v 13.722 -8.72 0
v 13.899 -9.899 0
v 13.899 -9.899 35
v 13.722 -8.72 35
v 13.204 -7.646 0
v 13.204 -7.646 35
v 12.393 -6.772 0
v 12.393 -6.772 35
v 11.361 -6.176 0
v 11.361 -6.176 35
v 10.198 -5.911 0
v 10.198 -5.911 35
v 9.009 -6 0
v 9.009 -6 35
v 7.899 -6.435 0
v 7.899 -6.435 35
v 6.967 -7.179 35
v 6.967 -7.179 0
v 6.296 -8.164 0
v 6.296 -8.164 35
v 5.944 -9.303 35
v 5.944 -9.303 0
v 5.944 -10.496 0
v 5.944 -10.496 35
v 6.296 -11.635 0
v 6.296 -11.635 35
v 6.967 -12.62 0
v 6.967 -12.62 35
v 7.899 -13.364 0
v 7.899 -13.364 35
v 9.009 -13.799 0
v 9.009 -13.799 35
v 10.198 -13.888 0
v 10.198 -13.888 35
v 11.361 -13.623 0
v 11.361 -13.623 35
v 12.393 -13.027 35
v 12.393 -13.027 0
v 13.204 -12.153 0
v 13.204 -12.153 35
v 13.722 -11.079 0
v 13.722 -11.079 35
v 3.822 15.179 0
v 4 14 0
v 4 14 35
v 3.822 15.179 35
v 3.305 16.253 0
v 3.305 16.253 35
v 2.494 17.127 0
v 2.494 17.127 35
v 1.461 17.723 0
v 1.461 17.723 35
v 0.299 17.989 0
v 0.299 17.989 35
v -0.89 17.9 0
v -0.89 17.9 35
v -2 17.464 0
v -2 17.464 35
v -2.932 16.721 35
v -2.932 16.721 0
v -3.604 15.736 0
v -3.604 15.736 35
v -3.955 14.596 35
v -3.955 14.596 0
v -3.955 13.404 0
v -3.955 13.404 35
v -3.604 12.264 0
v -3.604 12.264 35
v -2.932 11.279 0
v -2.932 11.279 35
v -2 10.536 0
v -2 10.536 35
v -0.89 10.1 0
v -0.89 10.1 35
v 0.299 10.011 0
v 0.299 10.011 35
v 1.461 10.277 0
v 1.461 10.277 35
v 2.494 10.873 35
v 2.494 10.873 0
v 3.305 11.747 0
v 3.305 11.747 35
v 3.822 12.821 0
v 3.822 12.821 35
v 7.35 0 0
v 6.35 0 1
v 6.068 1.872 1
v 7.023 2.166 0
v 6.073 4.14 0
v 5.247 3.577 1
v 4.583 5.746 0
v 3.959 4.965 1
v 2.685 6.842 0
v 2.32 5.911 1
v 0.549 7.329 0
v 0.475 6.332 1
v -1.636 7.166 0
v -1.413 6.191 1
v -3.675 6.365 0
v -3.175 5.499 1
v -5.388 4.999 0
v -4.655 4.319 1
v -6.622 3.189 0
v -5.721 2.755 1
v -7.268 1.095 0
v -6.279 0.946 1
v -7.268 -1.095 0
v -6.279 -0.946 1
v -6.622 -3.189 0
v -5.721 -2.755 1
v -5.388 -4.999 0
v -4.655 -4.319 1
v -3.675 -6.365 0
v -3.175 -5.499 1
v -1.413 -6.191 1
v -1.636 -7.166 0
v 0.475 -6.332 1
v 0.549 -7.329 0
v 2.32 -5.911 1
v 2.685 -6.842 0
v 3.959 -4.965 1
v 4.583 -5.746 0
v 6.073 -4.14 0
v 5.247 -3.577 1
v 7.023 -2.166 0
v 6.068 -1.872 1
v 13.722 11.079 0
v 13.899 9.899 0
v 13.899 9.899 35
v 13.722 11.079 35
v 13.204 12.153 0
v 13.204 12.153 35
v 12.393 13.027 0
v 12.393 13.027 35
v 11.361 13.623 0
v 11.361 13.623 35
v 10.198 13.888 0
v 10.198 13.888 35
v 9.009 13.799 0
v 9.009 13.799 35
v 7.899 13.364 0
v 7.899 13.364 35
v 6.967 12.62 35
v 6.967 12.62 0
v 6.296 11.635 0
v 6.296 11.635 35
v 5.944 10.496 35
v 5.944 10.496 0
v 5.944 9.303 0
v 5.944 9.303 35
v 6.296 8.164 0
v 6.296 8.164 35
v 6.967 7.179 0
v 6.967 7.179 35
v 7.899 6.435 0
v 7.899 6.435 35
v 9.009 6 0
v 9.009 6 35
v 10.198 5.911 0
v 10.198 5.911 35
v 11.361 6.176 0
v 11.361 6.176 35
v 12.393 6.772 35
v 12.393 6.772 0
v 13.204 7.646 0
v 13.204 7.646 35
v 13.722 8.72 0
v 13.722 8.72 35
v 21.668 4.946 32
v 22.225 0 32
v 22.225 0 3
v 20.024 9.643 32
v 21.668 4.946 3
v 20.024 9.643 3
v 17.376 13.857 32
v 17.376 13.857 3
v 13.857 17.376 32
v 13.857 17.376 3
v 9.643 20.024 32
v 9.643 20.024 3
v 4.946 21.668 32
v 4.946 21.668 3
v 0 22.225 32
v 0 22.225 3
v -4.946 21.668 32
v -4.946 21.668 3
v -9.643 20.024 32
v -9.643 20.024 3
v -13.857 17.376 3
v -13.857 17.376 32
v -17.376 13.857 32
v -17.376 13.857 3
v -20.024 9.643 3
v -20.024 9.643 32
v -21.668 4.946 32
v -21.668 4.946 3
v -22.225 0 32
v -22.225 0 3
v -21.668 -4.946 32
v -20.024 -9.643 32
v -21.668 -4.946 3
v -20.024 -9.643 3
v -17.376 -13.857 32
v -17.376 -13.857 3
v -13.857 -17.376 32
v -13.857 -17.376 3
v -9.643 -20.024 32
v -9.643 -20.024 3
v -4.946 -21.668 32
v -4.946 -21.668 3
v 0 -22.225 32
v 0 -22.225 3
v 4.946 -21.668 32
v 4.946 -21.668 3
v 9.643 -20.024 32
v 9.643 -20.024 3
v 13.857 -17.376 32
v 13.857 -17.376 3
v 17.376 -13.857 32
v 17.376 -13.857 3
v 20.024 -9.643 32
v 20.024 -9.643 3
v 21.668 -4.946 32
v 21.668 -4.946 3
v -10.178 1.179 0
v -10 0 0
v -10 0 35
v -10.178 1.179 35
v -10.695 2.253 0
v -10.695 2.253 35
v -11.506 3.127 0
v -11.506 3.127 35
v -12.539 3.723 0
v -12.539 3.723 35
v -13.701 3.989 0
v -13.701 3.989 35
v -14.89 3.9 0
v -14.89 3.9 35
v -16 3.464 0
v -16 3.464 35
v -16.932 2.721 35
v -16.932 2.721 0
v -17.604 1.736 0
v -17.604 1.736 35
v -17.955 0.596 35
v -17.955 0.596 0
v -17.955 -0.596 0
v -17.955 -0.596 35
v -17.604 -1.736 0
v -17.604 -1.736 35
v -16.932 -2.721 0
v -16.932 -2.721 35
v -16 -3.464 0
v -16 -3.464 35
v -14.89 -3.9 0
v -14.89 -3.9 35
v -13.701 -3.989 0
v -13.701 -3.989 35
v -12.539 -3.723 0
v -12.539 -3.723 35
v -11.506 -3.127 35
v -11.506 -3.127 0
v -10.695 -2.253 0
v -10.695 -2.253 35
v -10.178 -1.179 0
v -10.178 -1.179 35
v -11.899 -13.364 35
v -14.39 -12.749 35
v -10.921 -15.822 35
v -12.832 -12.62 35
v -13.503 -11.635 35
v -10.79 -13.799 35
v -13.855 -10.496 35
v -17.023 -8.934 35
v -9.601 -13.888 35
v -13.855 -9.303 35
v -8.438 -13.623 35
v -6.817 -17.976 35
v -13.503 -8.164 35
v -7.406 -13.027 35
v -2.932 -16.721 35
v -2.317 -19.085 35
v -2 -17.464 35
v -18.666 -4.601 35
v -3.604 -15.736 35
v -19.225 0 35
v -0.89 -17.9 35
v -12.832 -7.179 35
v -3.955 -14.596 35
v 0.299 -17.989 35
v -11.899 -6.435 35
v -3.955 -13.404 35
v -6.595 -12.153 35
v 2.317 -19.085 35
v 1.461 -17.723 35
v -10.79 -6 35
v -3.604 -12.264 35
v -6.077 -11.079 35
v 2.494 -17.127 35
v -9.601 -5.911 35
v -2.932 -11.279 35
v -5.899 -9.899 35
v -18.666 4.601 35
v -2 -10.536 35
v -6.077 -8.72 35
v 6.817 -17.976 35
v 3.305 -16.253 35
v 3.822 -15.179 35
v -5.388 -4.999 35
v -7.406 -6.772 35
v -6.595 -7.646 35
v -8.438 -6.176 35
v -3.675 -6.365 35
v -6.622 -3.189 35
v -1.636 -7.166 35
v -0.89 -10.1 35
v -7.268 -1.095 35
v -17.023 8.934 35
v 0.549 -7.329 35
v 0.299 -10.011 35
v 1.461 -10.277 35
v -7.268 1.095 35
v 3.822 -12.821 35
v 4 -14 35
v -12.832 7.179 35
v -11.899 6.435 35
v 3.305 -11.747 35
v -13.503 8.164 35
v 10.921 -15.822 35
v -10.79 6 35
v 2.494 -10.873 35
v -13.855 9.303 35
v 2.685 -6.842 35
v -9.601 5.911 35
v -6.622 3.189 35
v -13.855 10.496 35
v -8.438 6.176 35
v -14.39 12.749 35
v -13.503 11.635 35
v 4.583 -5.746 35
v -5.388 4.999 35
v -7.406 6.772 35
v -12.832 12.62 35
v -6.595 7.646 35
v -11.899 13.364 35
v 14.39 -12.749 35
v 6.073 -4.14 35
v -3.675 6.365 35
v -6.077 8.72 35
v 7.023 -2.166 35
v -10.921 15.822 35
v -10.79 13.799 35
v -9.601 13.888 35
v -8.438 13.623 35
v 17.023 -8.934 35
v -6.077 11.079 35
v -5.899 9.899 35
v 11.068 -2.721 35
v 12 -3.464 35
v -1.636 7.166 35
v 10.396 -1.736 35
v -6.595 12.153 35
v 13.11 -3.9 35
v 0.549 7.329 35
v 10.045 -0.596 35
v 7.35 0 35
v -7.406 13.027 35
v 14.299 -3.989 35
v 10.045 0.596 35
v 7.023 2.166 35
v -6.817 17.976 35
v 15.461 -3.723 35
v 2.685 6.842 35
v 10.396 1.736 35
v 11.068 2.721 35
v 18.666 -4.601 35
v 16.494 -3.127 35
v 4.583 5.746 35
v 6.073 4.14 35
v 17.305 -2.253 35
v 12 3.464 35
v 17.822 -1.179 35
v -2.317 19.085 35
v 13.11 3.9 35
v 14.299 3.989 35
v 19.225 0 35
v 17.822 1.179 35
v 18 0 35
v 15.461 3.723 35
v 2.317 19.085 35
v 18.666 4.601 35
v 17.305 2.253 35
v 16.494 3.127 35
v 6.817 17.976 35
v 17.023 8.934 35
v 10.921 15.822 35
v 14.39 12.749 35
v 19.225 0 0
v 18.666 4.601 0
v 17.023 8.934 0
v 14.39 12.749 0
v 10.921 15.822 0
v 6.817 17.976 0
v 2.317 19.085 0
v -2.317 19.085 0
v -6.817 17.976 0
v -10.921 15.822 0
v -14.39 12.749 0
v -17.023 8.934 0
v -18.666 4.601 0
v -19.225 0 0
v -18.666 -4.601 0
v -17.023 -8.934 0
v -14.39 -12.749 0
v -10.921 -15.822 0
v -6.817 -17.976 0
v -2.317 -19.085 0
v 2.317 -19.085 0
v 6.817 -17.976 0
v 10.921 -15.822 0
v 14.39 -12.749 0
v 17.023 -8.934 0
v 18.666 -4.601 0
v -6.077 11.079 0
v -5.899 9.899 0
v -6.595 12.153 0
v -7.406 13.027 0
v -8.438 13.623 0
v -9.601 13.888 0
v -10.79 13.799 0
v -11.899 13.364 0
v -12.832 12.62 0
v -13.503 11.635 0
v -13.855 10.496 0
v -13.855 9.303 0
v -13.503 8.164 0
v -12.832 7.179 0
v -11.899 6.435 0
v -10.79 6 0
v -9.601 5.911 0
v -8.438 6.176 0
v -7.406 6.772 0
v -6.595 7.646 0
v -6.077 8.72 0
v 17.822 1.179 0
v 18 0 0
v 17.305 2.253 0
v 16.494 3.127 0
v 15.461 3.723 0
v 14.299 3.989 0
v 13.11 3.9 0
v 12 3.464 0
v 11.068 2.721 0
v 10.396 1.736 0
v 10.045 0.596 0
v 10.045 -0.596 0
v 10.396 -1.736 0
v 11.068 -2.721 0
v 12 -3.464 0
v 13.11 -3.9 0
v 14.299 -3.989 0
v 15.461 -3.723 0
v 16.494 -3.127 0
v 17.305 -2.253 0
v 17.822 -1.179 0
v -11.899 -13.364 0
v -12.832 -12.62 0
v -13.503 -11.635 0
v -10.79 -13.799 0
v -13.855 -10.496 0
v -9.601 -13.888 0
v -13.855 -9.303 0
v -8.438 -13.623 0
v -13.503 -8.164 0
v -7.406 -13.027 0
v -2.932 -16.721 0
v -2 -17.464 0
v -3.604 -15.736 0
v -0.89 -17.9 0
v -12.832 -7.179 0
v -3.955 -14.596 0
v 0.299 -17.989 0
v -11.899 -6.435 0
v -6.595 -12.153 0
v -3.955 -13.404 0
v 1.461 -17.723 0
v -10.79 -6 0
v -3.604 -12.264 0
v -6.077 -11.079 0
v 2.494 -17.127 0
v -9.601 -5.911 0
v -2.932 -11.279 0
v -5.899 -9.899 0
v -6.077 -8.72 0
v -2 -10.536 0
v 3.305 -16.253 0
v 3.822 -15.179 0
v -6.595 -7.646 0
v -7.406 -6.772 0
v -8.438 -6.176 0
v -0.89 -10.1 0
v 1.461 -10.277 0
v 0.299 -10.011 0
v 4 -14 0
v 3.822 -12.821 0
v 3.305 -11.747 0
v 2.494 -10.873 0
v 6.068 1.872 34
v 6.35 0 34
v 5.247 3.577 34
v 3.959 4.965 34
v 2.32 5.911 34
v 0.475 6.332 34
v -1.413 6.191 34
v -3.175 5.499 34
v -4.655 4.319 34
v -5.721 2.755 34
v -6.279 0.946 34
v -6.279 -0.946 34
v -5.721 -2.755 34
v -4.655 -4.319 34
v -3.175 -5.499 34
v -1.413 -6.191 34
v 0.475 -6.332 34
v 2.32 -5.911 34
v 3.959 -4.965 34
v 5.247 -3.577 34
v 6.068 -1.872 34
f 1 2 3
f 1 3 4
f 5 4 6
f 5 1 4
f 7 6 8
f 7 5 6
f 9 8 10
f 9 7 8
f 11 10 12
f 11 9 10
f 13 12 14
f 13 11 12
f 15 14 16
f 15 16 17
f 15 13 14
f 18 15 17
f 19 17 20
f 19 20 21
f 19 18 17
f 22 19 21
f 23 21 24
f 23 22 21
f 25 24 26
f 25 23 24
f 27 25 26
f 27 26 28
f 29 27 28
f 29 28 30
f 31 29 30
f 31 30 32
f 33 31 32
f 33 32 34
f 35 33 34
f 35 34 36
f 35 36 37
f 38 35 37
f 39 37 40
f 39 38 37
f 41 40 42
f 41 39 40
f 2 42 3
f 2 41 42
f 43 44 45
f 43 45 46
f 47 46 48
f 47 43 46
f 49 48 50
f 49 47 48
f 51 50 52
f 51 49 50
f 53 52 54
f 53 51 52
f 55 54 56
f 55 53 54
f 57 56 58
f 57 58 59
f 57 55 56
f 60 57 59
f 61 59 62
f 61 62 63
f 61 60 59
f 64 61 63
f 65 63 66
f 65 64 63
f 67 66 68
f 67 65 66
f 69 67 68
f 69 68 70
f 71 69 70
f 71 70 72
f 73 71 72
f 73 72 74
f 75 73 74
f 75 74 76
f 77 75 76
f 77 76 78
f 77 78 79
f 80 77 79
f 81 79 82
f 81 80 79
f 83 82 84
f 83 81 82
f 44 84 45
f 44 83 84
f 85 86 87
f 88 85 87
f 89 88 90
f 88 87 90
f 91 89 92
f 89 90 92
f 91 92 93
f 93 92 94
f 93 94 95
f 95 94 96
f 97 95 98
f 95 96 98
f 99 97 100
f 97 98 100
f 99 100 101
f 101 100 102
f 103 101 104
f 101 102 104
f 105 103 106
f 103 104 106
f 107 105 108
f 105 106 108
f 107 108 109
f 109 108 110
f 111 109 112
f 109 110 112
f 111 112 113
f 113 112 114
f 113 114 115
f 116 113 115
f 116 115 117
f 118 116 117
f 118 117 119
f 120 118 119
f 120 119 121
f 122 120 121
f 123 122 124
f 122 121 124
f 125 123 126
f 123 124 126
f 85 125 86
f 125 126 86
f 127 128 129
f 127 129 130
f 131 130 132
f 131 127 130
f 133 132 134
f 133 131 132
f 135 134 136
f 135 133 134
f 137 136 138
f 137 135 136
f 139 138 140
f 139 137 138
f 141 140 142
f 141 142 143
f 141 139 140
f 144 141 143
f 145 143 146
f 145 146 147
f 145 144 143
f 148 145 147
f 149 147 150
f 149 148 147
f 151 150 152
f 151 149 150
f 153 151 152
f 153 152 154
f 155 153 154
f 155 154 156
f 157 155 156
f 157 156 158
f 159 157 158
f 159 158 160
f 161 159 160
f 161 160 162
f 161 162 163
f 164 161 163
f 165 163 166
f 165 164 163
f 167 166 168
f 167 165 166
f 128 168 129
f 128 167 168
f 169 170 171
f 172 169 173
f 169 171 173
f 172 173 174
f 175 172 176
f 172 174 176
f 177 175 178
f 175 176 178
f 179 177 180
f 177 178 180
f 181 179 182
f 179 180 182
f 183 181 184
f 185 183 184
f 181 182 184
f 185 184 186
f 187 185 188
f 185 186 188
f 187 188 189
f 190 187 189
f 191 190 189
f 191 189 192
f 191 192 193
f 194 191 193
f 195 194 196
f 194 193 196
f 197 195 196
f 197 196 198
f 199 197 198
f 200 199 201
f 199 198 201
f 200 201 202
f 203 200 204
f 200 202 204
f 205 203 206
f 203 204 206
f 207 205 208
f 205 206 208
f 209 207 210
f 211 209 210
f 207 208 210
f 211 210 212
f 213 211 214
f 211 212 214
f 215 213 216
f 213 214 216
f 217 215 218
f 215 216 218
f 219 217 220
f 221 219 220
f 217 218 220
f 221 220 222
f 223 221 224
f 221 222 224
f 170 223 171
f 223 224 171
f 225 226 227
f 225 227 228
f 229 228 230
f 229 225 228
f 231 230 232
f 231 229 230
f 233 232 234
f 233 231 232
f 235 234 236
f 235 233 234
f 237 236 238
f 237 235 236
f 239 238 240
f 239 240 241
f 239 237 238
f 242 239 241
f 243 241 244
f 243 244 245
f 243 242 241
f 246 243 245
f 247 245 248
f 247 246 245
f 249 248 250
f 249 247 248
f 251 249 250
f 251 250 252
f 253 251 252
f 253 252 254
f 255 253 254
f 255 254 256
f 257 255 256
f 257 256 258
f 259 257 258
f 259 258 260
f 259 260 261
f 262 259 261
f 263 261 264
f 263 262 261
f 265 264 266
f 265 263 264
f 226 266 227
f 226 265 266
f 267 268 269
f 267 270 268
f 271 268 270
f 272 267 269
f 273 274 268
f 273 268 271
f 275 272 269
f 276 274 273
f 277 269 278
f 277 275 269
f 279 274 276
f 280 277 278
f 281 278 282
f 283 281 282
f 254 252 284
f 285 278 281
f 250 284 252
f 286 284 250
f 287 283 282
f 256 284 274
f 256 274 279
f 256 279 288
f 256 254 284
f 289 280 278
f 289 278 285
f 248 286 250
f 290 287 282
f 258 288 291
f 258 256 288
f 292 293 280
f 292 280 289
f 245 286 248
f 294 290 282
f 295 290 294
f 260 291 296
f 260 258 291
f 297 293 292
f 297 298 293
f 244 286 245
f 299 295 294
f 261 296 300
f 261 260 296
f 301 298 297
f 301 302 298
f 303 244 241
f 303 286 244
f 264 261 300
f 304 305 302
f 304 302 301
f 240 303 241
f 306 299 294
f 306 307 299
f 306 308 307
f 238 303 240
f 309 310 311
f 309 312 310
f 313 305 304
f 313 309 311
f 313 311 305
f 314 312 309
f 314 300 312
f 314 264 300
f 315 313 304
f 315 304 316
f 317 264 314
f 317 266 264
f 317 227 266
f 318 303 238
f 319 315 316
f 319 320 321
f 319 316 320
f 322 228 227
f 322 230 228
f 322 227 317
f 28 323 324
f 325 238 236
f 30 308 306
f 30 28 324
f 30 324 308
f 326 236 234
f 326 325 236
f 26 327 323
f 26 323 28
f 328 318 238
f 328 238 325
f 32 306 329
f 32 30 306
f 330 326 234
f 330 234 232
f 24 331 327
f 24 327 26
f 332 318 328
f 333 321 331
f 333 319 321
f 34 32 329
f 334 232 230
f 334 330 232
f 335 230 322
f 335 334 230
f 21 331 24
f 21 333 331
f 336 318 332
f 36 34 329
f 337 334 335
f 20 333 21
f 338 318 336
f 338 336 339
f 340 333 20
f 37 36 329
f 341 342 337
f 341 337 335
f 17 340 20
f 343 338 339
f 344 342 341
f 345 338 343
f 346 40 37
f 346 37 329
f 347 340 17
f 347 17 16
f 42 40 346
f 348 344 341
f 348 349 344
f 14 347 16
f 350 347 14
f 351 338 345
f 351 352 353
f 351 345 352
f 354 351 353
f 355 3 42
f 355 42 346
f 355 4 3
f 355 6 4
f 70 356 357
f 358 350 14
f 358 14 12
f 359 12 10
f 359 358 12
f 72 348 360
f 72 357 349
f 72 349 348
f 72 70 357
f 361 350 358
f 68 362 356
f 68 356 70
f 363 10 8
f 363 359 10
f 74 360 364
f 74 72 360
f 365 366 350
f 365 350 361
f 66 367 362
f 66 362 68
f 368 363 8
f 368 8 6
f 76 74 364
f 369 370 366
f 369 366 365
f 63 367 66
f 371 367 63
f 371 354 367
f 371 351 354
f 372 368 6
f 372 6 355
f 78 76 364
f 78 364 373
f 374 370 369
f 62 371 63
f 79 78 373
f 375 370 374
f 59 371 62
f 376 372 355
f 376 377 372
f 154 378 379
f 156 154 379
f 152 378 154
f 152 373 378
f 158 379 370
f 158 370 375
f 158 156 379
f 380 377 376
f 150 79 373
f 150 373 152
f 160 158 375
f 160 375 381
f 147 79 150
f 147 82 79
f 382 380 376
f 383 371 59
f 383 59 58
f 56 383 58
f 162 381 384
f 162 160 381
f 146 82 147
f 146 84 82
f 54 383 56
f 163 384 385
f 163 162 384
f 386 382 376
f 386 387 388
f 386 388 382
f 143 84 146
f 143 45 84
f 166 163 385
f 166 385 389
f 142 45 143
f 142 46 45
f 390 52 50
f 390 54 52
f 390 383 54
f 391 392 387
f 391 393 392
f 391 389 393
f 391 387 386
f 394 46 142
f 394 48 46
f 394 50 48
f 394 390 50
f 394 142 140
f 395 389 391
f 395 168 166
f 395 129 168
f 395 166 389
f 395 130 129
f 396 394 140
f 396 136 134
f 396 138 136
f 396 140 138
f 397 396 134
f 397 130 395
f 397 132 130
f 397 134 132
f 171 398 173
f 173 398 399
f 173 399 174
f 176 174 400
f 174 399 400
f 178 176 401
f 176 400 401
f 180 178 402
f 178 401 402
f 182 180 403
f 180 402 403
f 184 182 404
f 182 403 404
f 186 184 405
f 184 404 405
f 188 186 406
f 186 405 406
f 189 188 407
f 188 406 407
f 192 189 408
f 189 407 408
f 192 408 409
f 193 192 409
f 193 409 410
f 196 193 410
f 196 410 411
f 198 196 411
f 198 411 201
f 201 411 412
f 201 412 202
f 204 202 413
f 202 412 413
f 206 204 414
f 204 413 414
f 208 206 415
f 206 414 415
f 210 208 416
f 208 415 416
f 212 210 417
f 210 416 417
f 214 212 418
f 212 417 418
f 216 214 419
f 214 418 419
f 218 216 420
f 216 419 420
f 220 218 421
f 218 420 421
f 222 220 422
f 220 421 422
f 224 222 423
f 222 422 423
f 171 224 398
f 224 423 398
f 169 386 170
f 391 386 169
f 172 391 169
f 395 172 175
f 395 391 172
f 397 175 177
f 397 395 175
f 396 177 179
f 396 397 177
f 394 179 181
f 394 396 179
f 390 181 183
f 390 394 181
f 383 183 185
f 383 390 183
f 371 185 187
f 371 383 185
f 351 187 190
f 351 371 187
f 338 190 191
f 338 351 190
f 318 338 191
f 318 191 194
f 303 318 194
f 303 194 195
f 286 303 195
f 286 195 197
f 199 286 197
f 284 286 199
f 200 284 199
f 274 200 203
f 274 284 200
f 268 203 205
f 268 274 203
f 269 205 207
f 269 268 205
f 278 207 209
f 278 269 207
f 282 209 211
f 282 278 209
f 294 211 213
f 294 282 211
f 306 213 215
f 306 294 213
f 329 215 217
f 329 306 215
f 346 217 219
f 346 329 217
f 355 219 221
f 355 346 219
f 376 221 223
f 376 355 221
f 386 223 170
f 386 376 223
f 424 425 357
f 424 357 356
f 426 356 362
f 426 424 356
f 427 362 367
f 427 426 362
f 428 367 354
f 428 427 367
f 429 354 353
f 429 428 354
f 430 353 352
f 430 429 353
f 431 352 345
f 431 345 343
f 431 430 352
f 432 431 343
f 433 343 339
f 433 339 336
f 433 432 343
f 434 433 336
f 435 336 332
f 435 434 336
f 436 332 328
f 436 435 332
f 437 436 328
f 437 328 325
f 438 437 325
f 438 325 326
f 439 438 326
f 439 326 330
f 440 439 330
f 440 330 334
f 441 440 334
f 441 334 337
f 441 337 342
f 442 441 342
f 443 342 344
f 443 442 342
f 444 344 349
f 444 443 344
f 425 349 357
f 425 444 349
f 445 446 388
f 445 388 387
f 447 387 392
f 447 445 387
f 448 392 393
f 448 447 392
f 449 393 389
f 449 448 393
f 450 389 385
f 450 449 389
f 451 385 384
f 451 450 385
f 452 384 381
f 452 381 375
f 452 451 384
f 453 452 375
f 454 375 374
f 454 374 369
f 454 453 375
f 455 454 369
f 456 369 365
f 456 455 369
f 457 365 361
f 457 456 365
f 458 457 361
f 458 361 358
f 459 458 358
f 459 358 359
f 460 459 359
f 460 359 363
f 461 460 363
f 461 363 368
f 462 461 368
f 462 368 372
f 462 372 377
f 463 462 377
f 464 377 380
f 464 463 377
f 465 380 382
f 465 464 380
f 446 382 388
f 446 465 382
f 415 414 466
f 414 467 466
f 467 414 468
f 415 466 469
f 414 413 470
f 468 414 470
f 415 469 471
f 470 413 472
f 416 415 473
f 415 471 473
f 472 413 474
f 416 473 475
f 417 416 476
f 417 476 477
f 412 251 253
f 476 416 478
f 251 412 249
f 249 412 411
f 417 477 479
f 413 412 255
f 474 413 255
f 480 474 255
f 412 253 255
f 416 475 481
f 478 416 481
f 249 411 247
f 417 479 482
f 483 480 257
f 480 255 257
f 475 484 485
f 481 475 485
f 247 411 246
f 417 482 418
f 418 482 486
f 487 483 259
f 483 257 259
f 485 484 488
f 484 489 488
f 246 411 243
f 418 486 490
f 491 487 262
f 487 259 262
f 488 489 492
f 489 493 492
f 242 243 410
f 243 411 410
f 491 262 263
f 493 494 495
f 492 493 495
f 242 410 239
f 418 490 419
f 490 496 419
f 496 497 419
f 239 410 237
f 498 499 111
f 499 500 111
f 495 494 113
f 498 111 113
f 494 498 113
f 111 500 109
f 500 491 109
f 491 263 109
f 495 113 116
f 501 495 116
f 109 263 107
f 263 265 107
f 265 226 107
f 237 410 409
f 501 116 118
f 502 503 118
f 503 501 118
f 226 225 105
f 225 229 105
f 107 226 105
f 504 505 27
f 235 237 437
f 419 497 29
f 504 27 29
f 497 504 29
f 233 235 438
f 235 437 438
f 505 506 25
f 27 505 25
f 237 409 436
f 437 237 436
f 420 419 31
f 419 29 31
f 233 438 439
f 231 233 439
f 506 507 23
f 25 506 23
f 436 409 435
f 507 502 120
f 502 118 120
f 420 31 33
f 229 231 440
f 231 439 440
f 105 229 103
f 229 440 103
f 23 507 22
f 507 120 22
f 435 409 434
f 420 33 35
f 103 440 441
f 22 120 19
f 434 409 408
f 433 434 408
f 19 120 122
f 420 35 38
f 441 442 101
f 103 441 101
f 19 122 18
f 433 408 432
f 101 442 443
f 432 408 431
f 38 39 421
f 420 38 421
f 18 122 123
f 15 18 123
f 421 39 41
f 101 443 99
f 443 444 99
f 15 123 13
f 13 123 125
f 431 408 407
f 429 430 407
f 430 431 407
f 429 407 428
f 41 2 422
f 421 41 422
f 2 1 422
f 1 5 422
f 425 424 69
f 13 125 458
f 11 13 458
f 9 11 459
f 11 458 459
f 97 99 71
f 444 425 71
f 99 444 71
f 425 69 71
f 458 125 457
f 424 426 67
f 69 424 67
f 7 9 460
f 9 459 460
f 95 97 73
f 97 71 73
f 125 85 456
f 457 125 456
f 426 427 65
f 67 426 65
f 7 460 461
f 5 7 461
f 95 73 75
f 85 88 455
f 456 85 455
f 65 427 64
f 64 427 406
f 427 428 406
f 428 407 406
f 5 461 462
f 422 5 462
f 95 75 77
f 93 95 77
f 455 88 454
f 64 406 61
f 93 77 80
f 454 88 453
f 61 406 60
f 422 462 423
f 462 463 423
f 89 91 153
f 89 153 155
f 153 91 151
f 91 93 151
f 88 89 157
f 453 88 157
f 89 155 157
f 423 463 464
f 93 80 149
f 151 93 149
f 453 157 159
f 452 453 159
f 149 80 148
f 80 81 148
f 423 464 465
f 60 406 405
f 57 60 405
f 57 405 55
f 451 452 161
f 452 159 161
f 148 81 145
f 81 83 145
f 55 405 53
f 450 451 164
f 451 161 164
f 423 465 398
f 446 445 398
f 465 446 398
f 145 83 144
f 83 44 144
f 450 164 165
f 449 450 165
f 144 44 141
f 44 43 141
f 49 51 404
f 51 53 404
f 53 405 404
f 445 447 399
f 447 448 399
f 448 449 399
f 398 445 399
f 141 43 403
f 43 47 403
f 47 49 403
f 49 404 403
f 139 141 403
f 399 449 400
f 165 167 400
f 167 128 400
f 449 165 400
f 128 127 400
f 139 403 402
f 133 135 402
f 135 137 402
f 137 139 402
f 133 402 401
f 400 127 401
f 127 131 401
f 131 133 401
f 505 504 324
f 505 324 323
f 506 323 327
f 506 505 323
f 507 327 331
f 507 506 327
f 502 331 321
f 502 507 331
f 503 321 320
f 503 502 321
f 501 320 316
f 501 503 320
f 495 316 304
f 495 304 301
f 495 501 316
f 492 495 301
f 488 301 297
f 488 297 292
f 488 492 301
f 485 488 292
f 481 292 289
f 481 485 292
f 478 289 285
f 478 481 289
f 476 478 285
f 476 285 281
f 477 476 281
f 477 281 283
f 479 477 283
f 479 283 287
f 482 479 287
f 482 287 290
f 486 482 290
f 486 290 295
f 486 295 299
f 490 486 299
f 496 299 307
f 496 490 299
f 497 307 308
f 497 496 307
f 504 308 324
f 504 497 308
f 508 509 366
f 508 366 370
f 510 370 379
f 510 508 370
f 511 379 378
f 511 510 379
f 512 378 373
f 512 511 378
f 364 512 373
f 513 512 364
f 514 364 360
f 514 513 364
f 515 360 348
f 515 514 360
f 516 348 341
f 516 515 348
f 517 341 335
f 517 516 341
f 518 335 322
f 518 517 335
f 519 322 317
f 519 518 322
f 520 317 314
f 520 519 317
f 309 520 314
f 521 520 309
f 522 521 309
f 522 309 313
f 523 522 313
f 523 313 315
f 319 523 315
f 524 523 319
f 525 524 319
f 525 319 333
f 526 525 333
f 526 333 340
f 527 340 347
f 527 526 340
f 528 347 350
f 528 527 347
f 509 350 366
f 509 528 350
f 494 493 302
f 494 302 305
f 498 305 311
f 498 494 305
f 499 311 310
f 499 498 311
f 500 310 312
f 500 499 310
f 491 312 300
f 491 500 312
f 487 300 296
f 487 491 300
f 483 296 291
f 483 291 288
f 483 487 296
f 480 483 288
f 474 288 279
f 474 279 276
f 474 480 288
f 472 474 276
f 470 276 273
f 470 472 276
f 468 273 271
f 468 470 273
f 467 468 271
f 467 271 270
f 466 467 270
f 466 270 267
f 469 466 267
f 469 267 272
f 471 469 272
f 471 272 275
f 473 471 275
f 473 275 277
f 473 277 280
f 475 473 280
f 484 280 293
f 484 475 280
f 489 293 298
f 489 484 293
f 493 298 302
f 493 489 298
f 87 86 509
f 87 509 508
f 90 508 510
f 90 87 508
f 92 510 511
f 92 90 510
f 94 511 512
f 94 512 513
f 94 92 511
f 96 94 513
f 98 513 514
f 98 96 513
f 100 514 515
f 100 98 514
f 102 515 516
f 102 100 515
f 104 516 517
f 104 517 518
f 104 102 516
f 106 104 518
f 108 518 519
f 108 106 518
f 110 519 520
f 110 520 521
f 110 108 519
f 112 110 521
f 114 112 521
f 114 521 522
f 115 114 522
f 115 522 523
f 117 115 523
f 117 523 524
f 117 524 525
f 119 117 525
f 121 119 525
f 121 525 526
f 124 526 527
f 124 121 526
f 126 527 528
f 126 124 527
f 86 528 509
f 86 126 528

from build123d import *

# Parameters (mm, degrees)
F0_R     = 22.225
F0_R_2   = 4
F0_R_3   = 6.35
F1_DEPTH = 35
F2_SIZE  = 3
F3_SIZE  = 1


with BuildPart() as f1:
    # F0 (on Top) → F1 (new body)
    with BuildSketch(Plane.XY):
        Circle(F0_R)
        with Locations((-9.899495, -9.899495)):
            Circle(F0_R_2, mode=Mode.SUBTRACT)
        with Locations((0, -14)):
            Circle(F0_R_2, mode=Mode.SUBTRACT)
        with Locations((9.899495, -9.899495)):
            Circle(F0_R_2, mode=Mode.SUBTRACT)
        with Locations((-14, 0)):
            Circle(F0_R_2, mode=Mode.SUBTRACT)
        with Locations((-9.899495, 9.899495)):
            Circle(F0_R_2, mode=Mode.SUBTRACT)
        Circle(F0_R_3, mode=Mode.SUBTRACT)
        with Locations((9.899495, 9.899495)):
            Circle(F0_R_2, mode=Mode.SUBTRACT)
        with Locations((14, 0)):
            Circle(F0_R_2, mode=Mode.SUBTRACT)
        with Locations((0, 14)):
            Circle(F0_R_2, mode=Mode.SUBTRACT)
    extrude(amount=F1_DEPTH)

    # F2
    f2_edges = [f1.edges().sort_by_distance(p)[0] for p in [
        (-22.225, 0, 35),
        (-22.225, 0, 0),
    ]]
    chamfer(f2_edges, length=F2_SIZE)

    # F3
    f3_edges = [f1.edges().sort_by_distance(p)[0] for p in [
        (-6.35, 0, 0),
        (-6.35, 0, 35),
    ]]
    chamfer(f3_edges, length=F3_SIZE)


solid = f1.part
